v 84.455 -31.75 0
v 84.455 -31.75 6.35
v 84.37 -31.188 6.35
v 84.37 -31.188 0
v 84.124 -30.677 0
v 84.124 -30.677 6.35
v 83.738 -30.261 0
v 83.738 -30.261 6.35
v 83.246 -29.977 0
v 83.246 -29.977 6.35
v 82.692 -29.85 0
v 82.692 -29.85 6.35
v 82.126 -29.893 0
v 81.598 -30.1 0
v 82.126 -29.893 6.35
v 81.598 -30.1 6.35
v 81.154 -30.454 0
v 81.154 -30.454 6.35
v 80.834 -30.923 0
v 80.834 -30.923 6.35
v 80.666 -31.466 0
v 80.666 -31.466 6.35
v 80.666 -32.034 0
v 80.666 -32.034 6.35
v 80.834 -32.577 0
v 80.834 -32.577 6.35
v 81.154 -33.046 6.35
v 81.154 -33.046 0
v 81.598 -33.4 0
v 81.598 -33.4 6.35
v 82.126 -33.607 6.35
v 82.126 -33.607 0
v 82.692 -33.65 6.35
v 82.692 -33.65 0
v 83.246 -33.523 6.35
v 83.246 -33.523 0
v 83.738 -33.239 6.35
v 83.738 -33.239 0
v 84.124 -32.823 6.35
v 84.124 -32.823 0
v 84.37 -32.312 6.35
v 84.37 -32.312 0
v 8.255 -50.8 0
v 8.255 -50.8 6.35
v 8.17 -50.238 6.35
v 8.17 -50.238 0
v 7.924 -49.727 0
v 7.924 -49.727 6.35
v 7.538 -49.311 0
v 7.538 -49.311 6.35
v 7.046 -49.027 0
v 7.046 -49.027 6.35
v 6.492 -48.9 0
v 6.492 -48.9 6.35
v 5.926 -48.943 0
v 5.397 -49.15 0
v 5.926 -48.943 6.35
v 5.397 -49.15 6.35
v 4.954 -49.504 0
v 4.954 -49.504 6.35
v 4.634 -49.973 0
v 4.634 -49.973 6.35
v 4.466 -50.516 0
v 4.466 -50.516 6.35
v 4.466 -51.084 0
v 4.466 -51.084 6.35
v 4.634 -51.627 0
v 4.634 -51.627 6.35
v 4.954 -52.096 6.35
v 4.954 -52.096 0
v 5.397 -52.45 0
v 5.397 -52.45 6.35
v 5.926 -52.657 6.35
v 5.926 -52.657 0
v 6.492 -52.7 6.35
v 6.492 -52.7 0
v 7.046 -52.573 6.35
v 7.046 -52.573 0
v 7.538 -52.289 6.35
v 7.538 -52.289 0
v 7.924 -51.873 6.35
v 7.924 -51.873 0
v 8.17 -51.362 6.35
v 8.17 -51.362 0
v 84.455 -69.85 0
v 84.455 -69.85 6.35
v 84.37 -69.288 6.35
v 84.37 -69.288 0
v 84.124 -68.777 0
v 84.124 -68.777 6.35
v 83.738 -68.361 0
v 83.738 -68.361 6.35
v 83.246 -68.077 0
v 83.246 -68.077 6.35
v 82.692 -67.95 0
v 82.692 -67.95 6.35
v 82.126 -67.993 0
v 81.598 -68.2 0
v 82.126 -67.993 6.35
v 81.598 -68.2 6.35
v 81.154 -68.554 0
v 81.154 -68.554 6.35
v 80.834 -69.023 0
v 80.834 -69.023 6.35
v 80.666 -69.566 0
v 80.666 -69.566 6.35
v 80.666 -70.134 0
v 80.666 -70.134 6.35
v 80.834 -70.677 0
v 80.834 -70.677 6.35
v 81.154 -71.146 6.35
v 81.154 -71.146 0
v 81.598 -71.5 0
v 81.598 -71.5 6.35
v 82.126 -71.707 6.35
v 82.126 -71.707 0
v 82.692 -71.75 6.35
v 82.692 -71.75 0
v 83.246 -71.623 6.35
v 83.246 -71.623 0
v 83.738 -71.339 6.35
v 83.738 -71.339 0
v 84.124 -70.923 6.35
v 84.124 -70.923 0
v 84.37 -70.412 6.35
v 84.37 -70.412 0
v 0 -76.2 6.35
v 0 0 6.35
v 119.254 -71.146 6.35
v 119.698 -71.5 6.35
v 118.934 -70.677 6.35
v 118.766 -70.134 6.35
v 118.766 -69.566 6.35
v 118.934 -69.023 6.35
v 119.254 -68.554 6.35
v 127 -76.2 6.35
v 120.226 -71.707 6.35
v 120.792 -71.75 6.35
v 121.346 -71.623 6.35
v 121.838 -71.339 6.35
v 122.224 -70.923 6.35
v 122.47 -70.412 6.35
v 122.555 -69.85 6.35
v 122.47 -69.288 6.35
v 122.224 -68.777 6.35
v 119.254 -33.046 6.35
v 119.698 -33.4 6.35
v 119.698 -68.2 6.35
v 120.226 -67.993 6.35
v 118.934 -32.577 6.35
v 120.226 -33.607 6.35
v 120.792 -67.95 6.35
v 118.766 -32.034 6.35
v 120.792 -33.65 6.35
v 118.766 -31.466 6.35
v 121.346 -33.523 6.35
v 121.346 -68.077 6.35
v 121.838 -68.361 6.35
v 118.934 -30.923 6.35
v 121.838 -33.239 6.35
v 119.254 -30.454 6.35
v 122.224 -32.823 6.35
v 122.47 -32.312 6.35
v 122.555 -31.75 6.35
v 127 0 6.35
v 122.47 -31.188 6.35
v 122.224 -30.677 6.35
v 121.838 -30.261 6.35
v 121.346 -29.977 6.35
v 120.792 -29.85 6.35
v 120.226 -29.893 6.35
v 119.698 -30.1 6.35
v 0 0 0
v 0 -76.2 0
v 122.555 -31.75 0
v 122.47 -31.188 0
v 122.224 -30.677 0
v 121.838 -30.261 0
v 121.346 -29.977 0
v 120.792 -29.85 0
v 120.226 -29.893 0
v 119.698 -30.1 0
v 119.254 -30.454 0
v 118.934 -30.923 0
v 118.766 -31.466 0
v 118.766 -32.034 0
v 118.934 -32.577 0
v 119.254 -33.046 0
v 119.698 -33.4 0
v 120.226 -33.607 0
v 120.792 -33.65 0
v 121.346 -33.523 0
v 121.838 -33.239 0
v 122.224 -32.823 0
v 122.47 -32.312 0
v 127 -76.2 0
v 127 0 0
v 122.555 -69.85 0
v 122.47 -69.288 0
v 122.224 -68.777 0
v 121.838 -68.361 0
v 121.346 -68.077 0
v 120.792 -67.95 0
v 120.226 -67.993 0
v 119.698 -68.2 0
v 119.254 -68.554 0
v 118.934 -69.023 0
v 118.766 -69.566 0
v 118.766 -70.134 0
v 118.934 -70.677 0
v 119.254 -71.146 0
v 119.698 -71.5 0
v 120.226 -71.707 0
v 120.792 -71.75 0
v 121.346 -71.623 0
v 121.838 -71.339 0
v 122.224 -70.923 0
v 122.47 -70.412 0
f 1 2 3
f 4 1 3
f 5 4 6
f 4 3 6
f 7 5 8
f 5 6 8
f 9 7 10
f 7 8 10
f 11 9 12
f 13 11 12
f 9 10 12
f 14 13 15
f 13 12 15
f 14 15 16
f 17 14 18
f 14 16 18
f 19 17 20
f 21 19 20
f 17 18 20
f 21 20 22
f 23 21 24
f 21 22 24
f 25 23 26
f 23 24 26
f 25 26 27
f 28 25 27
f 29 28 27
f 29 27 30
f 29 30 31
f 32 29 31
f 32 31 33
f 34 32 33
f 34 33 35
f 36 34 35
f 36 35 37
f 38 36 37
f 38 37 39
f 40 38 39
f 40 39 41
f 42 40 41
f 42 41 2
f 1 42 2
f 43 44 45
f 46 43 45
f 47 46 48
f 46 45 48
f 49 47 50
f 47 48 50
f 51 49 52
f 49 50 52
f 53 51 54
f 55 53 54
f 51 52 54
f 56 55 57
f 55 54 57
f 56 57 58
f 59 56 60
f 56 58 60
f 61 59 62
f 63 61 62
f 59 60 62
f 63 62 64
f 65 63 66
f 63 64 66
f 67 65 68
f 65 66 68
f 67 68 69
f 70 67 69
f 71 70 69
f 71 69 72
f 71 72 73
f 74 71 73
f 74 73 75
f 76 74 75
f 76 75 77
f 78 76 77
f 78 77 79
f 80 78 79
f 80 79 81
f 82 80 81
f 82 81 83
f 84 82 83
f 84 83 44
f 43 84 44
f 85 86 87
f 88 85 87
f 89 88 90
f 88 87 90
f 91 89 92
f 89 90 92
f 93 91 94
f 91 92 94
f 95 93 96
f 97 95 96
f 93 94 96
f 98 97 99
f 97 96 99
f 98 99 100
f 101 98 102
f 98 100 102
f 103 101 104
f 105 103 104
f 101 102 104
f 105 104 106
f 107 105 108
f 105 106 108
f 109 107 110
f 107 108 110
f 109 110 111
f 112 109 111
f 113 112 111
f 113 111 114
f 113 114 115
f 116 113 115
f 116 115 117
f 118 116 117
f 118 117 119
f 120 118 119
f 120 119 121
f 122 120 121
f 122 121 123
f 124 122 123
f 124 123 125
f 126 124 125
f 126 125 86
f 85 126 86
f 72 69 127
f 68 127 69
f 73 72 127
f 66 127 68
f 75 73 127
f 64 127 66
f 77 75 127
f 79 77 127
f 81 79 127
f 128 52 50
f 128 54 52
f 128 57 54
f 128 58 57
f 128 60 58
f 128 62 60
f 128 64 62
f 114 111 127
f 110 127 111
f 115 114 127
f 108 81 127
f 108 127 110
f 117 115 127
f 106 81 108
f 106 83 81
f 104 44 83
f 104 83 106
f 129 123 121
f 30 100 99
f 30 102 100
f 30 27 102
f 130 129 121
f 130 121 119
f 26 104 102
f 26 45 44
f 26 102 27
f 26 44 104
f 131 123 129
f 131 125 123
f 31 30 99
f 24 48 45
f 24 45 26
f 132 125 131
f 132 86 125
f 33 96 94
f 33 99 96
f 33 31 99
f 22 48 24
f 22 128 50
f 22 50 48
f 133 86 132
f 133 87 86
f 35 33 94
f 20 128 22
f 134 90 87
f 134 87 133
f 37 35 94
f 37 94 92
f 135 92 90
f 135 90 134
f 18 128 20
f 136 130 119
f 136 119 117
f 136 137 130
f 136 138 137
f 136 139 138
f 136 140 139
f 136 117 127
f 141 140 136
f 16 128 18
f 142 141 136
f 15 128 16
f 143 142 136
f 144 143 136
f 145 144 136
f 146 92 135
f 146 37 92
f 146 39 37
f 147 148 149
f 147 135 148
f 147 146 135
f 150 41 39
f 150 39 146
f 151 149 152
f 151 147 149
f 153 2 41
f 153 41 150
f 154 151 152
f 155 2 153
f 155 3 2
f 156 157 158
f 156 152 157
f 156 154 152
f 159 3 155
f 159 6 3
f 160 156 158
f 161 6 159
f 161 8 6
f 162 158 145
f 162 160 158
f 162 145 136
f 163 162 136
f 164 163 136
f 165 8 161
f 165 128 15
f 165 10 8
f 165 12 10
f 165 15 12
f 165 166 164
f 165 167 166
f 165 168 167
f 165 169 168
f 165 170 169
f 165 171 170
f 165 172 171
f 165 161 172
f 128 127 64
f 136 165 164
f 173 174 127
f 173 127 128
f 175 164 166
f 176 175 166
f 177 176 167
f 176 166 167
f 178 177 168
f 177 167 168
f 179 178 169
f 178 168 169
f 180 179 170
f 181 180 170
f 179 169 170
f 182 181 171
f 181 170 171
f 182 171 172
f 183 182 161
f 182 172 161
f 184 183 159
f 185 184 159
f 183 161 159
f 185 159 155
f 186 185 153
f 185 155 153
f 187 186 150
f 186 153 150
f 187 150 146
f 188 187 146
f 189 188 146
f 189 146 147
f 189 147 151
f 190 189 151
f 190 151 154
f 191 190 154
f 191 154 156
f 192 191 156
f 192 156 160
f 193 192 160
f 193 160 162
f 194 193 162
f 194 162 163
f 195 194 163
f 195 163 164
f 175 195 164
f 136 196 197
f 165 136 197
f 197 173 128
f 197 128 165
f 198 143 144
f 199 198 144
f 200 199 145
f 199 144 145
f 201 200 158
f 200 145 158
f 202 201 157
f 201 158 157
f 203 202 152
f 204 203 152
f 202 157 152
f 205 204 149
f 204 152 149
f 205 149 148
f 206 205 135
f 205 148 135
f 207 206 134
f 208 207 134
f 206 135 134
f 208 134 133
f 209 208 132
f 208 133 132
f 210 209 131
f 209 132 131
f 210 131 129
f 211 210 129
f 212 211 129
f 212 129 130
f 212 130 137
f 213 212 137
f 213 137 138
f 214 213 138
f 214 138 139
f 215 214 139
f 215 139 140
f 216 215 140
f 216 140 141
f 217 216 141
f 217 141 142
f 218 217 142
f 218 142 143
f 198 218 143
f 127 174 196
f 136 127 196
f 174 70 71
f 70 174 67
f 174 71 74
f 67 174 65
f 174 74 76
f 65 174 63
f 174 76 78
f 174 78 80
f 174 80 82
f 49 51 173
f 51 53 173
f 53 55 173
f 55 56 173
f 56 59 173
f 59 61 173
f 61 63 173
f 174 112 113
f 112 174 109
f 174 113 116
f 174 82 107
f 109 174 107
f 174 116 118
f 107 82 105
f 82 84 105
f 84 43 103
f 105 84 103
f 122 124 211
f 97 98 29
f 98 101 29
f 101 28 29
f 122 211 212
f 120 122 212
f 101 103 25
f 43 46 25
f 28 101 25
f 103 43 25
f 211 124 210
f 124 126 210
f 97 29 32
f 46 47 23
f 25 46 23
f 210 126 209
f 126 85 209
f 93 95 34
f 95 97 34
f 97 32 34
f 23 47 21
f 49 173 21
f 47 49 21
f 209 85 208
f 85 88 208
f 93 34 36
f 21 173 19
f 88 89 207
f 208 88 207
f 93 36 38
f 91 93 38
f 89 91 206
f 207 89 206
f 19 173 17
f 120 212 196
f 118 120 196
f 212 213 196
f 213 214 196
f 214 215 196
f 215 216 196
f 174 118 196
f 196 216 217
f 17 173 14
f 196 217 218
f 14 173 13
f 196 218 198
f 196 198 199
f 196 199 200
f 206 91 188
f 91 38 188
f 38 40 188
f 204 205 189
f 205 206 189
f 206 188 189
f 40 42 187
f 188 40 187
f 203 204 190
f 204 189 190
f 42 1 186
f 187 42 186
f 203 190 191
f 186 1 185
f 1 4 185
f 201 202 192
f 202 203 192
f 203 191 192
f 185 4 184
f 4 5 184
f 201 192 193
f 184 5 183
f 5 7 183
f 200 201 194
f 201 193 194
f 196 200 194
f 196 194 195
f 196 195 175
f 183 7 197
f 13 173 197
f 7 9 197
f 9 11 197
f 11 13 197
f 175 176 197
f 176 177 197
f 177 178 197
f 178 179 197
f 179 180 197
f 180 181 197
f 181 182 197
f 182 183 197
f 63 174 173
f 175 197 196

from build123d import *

# Parameters (mm, degrees)
SKETCH1_W           = 127
SKETCH1_H           = 76.2
BOSS_EXTRUDE1_DEPTH = 6.35
CUT_EXTRUDE1_REACH  = 8.35
SKETCH2_R           = 1.905


with BuildPart() as part:
    # Sketch1 → Boss-Extrude1 (new body)
    with BuildSketch(Plane.XY):
        with Locations((63.5, -38.1)):
            Rectangle(SKETCH1_W, SKETCH1_H)
    extrude(amount=BOSS_EXTRUDE1_DEPTH)

    # Sketch2 → Cut-Extrude1 (cut, up to next)
    with BuildSketch(Plane.XY.offset(6.35), mode=Mode.PRIVATE) as cut_extrude1_sk1:
        with Locations((82.55, -31.75)):
            Circle(SKETCH2_R)
    cut_extrude1_tool1 = extrude(cut_extrude1_sk1.sketch, amount=-CUT_EXTRUDE1_REACH, mode=Mode.PRIVATE) & part.part
    add(cut_extrude1_tool1.solids().sort_by_distance((82.55, -31.75, 6.35))[0], mode=Mode.SUBTRACT)
    # Sketch2 → Cut-Extrude1 (cut, up to next)
    with BuildSketch(Plane.XY.offset(6.35), mode=Mode.PRIVATE) as cut_extrude1_sk2:
        with Locations((120.65, -31.75)):
            Circle(SKETCH2_R)
    cut_extrude1_tool2 = extrude(cut_extrude1_sk2.sketch, amount=-CUT_EXTRUDE1_REACH, mode=Mode.PRIVATE) & part.part
    add(cut_extrude1_tool2.solids().sort_by_distance((120.65, -31.75, 6.35))[0], mode=Mode.SUBTRACT)
    # Sketch2 → Cut-Extrude1 (cut, up to next)
    with BuildSketch(Plane.XY.offset(6.35), mode=Mode.PRIVATE) as cut_extrude1_sk3:
        with Locations((82.55, -69.85)):
            Circle(SKETCH2_R)
    cut_extrude1_tool3 = extrude(cut_extrude1_sk3.sketch, amount=-CUT_EXTRUDE1_REACH, mode=Mode.PRIVATE) & part.part
    add(cut_extrude1_tool3.solids().sort_by_distance((82.55, -69.85, 6.35))[0], mode=Mode.SUBTRACT)
    # Sketch2 → Cut-Extrude1 (cut, up to next)
    with BuildSketch(Plane.XY.offset(6.35), mode=Mode.PRIVATE) as cut_extrude1_sk4:
        with Locations((120.65, -69.85)):
            Circle(SKETCH2_R)
    cut_extrude1_tool4 = extrude(cut_extrude1_sk4.sketch, amount=-CUT_EXTRUDE1_REACH, mode=Mode.PRIVATE) & part.part
    add(cut_extrude1_tool4.solids().sort_by_distance((120.65, -69.85, 6.35))[0], mode=Mode.SUBTRACT)
    # Sketch2 → Cut-Extrude1 (cut, up to next)
    with BuildSketch(Plane.XY.offset(6.35), mode=Mode.PRIVATE) as cut_extrude1_sk5:
        with Locations((6.35, -50.8)):
            Circle(SKETCH2_R)
    cut_extrude1_tool5 = extrude(cut_extrude1_sk5.sketch, amount=-CUT_EXTRUDE1_REACH, mode=Mode.PRIVATE) & part.part
    add(cut_extrude1_tool5.solids().sort_by_distance((6.35, -50.8, 6.35))[0], mode=Mode.SUBTRACT)


solid = part.part
